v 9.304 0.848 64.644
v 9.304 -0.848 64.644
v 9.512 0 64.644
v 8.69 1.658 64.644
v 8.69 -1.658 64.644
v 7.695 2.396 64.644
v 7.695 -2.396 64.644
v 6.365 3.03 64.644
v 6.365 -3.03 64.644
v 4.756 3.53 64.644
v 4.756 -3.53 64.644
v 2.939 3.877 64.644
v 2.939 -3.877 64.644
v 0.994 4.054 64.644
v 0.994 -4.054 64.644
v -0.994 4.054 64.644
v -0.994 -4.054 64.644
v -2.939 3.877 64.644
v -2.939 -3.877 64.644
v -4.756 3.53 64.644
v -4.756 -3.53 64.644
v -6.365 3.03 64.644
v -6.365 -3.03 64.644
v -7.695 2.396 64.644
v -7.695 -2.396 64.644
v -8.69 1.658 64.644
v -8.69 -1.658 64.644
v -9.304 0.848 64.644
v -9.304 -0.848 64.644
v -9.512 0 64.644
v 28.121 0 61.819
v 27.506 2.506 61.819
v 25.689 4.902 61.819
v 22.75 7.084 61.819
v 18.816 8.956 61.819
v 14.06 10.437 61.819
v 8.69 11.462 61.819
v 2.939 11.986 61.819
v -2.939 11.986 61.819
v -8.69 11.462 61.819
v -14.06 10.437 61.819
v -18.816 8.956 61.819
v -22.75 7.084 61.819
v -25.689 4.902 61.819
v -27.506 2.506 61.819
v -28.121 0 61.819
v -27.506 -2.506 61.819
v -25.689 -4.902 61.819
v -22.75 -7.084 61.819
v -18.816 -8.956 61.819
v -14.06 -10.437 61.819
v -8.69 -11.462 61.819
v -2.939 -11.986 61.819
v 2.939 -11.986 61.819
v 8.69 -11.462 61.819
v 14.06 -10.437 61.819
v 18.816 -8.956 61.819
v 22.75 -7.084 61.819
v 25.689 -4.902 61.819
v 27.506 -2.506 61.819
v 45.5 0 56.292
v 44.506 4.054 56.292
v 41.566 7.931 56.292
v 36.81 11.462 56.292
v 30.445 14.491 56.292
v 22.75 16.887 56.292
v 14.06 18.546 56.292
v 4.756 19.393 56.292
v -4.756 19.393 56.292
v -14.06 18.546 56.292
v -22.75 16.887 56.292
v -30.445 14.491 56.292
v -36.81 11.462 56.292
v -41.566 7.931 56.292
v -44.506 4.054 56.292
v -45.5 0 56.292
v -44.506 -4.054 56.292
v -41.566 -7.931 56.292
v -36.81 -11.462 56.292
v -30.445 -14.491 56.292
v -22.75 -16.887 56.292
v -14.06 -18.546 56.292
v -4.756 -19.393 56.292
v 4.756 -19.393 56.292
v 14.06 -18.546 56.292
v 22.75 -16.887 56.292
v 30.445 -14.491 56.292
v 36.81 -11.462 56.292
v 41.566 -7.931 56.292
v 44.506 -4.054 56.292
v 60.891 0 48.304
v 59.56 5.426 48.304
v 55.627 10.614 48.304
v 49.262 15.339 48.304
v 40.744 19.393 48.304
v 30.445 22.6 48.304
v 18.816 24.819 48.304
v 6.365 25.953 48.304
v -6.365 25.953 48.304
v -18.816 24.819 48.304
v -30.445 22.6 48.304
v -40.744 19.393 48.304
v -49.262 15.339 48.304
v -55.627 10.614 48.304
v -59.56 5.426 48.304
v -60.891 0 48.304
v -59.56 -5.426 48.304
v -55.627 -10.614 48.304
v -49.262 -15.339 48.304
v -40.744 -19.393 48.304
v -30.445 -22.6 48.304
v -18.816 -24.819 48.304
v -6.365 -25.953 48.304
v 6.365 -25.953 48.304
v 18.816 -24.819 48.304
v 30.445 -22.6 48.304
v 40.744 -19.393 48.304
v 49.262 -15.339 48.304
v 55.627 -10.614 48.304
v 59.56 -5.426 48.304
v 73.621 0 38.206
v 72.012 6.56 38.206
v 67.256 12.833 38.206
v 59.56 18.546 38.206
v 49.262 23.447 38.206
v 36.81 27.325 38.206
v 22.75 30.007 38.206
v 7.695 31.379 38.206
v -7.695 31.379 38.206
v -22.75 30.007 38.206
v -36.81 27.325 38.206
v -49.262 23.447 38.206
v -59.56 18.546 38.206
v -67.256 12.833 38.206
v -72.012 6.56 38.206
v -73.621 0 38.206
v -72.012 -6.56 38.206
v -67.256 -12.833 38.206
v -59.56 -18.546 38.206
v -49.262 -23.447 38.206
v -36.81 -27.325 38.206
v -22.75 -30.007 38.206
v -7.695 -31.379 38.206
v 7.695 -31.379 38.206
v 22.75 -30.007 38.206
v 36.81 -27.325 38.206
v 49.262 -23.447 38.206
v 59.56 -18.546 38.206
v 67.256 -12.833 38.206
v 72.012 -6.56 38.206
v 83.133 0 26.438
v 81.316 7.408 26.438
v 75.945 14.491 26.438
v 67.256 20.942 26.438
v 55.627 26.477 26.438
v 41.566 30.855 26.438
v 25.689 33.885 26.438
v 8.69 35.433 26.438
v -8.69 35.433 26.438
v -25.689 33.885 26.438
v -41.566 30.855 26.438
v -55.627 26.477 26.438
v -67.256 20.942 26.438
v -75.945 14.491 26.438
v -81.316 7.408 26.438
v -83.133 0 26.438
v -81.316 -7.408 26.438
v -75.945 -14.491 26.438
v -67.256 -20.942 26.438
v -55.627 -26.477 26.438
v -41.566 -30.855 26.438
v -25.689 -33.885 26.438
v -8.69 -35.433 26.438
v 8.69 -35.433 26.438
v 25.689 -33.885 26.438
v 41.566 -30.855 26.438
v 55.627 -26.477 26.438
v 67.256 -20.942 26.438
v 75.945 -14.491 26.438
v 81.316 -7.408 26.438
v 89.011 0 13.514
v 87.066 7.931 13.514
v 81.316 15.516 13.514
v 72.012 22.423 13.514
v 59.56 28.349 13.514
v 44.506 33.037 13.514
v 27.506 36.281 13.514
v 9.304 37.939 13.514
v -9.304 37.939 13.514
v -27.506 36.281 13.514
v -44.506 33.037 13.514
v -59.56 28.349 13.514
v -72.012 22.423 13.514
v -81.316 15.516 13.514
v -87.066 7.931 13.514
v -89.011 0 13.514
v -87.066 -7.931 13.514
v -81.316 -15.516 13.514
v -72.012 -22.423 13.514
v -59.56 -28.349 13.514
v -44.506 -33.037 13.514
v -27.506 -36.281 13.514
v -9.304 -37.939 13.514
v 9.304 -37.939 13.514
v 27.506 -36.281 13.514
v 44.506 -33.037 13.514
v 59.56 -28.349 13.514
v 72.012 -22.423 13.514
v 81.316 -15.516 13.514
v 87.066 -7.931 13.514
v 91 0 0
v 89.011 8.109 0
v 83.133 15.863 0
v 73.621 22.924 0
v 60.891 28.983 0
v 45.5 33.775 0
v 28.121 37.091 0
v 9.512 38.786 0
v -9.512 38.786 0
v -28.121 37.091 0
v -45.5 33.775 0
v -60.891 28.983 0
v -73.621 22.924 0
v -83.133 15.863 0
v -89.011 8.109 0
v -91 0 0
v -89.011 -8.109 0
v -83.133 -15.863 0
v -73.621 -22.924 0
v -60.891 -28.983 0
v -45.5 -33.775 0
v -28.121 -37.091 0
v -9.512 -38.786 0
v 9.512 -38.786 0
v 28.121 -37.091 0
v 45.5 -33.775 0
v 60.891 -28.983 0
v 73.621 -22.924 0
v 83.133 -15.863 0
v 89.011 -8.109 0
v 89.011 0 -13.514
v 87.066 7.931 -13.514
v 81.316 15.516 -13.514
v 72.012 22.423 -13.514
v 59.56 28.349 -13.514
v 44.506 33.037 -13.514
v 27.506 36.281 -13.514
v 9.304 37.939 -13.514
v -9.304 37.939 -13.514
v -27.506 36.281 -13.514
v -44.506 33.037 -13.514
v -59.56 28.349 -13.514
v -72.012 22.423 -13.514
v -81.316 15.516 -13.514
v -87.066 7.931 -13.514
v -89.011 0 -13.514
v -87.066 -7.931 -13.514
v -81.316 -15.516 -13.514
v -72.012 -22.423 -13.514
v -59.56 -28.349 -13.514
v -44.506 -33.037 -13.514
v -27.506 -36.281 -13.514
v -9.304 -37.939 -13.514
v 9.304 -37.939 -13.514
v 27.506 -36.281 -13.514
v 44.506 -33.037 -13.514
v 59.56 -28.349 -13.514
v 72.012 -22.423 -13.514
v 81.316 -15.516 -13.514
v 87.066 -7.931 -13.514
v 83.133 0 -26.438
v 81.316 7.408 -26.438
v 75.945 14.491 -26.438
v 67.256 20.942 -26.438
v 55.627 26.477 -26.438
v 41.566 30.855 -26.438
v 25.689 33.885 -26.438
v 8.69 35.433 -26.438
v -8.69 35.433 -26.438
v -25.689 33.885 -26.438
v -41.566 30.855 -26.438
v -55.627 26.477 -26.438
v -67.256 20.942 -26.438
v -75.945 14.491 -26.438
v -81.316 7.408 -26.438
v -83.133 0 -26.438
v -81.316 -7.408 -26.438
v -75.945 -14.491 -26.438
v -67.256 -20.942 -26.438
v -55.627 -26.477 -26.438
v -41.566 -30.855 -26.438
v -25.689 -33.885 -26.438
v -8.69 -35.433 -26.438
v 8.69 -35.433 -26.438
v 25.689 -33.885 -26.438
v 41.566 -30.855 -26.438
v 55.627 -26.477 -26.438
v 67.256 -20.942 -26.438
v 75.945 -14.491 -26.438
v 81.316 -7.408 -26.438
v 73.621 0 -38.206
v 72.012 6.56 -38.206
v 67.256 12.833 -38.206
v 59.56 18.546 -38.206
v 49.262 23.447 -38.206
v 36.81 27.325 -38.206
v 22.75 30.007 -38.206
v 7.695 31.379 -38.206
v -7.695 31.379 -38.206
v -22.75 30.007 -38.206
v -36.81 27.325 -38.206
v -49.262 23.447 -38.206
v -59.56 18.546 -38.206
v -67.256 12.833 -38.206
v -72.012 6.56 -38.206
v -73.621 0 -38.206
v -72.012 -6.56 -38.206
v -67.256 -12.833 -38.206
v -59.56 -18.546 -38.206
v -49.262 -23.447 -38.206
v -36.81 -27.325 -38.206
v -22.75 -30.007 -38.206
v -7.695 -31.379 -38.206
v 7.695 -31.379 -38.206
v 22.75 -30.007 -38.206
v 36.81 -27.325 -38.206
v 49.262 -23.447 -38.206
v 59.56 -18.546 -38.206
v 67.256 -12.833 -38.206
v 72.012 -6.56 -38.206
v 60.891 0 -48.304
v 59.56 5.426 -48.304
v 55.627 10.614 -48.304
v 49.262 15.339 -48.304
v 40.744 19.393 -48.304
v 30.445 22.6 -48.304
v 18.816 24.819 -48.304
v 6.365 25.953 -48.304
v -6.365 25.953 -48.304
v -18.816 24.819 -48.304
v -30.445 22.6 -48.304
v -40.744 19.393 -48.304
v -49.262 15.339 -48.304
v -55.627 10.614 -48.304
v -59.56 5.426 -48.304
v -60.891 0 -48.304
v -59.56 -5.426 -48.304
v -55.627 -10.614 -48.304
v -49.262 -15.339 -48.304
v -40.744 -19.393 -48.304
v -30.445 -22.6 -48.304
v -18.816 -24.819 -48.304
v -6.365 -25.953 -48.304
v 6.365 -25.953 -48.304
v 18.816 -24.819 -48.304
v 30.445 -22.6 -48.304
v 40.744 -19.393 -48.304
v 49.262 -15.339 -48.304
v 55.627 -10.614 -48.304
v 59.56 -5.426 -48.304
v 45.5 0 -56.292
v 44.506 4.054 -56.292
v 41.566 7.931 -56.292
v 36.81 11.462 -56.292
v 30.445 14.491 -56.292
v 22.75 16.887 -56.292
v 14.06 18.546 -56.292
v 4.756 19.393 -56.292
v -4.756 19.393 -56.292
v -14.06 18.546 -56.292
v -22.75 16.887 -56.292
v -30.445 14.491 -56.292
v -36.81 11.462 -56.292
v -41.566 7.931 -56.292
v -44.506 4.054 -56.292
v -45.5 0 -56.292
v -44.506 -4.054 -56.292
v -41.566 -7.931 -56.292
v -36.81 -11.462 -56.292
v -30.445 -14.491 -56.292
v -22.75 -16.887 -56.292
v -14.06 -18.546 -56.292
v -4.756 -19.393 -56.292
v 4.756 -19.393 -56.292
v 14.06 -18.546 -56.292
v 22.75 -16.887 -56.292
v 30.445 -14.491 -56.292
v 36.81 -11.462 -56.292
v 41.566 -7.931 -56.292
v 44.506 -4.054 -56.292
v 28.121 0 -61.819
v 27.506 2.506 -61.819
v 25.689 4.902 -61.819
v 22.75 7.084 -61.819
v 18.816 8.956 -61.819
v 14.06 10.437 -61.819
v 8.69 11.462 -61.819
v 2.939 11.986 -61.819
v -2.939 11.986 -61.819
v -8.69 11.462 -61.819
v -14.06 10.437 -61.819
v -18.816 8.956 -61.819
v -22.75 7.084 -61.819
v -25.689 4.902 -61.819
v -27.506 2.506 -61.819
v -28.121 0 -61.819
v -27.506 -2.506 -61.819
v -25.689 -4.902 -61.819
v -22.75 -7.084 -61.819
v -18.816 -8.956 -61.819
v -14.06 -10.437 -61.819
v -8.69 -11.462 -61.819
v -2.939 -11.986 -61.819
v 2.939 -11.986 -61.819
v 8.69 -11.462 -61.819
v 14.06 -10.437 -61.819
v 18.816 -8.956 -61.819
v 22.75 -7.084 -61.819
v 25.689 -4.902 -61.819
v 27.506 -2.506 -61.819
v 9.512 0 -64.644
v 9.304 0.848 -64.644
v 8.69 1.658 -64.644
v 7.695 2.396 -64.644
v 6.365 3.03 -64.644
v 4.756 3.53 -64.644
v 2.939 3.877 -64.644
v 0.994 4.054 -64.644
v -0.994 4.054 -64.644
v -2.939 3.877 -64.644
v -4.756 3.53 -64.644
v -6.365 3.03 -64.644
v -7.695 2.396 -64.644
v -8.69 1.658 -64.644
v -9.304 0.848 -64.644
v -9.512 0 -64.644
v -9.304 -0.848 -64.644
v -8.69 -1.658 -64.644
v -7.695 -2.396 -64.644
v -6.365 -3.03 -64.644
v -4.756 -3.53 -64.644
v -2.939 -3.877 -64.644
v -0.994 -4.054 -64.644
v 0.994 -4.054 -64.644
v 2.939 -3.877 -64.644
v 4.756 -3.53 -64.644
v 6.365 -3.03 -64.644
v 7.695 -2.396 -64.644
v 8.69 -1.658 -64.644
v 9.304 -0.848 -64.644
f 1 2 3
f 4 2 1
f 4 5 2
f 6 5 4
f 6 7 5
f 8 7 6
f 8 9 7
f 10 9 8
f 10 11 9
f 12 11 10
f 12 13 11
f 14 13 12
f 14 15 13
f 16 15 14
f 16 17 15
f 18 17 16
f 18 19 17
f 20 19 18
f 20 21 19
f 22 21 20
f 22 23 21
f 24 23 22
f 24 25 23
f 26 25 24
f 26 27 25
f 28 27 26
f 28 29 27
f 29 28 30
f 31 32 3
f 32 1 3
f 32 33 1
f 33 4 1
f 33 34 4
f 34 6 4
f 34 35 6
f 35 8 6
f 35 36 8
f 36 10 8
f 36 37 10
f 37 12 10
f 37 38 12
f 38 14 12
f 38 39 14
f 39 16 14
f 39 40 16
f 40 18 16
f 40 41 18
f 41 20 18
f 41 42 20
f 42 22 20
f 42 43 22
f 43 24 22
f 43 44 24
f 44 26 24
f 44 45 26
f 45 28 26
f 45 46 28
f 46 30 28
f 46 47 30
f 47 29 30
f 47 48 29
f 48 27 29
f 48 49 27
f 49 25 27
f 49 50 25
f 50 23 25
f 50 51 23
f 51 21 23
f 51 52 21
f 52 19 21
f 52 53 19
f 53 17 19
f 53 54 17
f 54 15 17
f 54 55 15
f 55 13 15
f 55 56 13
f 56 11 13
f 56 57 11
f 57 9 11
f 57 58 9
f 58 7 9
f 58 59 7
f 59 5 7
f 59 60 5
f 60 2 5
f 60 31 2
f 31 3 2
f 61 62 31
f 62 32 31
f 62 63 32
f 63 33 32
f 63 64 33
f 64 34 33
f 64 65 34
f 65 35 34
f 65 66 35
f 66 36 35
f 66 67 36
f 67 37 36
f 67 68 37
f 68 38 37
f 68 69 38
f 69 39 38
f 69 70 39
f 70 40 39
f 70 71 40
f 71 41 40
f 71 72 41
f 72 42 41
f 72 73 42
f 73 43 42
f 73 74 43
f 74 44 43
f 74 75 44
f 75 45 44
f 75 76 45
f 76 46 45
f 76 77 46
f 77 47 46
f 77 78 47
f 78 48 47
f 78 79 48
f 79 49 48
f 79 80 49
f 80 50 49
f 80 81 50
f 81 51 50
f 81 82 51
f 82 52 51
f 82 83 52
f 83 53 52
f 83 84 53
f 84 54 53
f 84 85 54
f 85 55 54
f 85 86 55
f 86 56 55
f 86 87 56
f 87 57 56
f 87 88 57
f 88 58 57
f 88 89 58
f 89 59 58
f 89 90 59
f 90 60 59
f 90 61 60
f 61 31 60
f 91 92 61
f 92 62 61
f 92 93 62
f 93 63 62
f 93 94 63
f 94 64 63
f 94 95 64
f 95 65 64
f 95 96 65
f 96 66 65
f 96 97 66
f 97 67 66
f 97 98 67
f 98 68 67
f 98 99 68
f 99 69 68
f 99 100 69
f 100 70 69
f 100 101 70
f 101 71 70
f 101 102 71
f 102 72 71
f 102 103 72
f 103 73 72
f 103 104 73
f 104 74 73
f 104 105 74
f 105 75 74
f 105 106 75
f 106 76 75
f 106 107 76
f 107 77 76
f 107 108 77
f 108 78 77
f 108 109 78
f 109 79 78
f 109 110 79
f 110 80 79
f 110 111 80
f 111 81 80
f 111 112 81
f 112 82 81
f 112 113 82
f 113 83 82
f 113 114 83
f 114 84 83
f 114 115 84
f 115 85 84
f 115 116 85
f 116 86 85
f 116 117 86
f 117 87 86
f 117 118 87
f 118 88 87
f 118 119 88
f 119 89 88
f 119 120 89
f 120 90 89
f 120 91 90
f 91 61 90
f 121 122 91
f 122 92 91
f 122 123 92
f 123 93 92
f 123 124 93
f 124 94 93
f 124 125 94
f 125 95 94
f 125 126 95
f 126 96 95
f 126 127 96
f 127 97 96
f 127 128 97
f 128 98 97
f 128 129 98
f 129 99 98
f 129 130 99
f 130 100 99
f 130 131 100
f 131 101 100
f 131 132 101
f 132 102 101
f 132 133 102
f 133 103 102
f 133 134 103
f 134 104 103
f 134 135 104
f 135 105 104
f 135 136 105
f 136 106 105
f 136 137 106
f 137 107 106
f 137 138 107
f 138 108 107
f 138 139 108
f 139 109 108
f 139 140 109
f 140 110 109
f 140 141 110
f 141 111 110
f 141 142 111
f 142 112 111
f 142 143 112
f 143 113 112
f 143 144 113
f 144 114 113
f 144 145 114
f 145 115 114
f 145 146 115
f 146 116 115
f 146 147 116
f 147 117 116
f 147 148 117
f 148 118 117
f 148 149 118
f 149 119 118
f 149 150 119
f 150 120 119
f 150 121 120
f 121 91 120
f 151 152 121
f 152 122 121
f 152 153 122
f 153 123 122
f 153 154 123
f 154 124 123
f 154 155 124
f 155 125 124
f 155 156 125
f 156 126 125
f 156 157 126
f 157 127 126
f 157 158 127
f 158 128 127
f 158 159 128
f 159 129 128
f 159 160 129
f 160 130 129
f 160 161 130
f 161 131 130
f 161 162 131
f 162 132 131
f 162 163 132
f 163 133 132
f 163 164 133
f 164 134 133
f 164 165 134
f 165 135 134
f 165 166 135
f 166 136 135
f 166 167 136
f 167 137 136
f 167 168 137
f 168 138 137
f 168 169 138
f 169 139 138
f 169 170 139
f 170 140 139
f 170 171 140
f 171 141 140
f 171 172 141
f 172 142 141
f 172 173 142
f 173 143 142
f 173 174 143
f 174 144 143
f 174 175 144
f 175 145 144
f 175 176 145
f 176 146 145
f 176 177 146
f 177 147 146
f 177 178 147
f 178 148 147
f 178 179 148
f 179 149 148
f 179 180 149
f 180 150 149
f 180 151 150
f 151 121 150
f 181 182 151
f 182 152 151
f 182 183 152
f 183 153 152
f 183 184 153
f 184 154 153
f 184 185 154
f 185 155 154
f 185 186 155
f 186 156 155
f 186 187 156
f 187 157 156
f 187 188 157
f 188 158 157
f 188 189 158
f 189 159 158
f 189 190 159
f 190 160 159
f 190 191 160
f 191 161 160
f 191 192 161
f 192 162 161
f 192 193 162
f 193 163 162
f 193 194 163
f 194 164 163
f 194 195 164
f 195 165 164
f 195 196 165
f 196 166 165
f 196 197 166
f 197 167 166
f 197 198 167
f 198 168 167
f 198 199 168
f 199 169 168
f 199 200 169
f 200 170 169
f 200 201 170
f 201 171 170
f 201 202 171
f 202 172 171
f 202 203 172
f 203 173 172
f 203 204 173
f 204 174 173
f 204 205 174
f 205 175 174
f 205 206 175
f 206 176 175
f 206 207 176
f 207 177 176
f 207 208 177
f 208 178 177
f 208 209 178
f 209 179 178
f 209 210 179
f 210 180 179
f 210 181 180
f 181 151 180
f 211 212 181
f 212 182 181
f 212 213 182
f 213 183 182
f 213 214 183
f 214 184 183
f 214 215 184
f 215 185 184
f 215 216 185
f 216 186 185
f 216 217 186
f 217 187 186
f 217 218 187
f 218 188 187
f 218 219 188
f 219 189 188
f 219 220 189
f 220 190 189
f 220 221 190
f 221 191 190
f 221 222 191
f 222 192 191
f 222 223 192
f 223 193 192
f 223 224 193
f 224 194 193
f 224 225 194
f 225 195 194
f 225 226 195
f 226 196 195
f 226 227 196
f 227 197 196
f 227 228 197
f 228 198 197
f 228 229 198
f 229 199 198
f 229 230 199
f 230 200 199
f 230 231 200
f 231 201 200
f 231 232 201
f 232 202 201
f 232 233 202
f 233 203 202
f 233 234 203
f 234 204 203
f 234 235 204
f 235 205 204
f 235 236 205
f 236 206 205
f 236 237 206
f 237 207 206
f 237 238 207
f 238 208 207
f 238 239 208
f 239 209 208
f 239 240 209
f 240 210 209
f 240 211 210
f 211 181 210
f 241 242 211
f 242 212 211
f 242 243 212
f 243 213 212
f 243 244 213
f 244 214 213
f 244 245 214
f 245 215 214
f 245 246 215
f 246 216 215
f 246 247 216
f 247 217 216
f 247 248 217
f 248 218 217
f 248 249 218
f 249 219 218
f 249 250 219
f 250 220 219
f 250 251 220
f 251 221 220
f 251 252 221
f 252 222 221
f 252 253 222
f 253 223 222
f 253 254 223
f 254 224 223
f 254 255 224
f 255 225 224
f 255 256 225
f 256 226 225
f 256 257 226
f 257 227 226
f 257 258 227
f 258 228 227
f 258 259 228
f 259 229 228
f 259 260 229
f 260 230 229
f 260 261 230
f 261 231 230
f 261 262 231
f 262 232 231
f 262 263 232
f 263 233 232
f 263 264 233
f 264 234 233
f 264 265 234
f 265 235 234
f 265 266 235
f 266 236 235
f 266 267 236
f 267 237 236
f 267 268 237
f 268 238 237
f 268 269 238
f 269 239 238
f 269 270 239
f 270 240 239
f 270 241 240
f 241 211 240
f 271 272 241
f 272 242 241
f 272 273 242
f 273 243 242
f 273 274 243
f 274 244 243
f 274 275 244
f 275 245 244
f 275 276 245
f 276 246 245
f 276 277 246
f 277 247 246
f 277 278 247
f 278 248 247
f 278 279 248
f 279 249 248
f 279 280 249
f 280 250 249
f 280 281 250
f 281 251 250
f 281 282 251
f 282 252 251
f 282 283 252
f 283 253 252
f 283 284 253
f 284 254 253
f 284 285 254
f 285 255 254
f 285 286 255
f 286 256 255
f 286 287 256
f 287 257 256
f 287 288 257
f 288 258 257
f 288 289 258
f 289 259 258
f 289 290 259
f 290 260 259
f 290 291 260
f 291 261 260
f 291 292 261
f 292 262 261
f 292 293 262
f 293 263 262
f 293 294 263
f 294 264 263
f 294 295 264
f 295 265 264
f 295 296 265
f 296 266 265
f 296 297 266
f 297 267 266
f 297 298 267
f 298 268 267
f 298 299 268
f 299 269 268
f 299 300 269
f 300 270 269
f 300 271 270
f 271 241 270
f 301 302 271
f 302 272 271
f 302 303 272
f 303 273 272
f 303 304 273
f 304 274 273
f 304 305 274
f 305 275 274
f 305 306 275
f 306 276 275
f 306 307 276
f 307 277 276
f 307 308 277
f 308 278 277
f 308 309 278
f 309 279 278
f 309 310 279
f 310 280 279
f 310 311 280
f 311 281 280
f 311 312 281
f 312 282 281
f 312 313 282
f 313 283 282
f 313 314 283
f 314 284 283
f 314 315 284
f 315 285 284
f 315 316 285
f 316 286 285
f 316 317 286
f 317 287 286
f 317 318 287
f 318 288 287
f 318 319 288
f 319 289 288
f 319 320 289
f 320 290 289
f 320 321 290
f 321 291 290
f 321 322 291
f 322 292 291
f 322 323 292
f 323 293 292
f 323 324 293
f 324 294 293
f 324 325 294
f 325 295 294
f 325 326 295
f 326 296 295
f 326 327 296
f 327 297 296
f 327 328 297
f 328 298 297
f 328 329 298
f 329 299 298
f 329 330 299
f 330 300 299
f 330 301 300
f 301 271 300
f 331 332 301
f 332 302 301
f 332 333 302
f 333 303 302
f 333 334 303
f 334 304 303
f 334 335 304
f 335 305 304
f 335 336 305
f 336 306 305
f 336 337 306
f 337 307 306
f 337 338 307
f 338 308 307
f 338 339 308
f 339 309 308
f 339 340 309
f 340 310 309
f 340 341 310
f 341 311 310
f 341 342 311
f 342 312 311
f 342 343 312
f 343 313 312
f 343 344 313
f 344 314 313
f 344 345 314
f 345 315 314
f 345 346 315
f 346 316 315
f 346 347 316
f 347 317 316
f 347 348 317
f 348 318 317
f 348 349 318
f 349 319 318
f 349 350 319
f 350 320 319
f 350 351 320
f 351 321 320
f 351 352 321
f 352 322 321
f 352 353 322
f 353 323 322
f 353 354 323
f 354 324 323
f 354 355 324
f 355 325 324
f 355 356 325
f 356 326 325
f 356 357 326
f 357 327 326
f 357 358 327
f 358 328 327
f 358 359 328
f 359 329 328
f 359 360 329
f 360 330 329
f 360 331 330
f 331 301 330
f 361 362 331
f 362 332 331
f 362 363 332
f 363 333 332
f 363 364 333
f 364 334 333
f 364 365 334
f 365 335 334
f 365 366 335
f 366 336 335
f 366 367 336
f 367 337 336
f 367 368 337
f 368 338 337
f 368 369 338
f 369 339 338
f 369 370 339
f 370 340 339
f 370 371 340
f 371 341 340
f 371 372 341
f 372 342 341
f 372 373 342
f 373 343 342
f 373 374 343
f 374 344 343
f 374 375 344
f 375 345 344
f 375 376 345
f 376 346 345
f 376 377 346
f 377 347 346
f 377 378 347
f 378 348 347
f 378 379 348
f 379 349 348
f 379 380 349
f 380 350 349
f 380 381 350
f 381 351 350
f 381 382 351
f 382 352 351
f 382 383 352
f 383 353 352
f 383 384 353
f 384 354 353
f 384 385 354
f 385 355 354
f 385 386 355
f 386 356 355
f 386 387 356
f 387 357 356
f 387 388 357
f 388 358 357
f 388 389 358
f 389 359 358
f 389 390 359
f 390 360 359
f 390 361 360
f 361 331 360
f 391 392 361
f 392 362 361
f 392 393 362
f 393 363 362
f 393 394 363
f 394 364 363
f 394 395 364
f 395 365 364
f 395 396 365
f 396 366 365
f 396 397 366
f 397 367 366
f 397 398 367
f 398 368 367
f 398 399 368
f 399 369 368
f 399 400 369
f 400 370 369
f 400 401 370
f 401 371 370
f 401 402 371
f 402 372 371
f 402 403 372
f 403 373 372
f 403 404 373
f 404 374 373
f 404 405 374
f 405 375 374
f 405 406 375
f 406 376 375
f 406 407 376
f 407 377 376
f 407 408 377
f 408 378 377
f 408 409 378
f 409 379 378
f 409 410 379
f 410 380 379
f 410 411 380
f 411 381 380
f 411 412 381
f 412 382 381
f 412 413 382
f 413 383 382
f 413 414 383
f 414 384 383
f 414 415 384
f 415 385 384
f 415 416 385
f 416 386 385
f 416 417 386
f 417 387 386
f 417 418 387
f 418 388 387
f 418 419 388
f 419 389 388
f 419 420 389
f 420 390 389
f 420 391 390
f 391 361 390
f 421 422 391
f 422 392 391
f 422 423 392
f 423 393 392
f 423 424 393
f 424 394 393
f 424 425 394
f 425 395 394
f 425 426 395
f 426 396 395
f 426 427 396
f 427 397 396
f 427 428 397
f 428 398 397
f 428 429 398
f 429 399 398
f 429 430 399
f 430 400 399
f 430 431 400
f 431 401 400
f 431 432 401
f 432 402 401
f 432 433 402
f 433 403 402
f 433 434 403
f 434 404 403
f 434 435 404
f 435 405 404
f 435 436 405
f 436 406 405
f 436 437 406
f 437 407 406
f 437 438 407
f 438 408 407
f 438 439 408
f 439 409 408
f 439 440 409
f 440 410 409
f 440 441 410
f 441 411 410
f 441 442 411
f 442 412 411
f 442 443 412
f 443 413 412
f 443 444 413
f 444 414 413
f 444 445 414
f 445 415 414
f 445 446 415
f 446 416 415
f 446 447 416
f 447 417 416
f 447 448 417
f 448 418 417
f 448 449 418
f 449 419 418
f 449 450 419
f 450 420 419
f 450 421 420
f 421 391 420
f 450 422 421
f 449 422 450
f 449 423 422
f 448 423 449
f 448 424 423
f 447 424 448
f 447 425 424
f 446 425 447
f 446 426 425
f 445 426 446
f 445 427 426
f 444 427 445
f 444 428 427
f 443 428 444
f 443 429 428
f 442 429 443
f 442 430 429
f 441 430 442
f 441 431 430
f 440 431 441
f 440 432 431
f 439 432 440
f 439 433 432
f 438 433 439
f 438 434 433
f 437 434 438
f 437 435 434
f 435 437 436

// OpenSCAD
// Generated by SolidPython 1.0.1 on 2020-07-29 00:46:47


scale(v = [7, 3, 5]) {
	sphere(r = 13);
}
/***********************************************
*********      SolidPython code:      **********
************************************************
 
# import packages: SolidPython
from solid import *
from solid.utils import *
from itertools import chain, combinations, permutations


class Resize:

    def __init__(self, scad_file):
        self.scad_file = scad_file
        #self.scad_file = import_scad(scad_file)
        # cone/cylinder param:
        self.r1 = 0
        self.r2 = 0
        self.h = 0
        # rectangular prism param:
        self.w = 0
        self.l = 0
        # ellipse param:
        self.r = 0

    # import OpenScad code (file name corresponds to shape)


    # classify shape + parameters
    def assign(self, param1, param2, param3):
        if self.scad_file == 'cone.scad':
            self.r1 = param1
            self.r2 = param2
            self.h = param3
        elif self.scad_file == 'cylinder.scad':
            self.r1 = param1
            self.r2 = param2
            self.h = param3
        elif self.scad_file == 'rectangularPrism.scad':
            self.h = param1
            self.l = param2
            self.w = param3
        else:
            self.r = param1
            self.h = param2

    # resize parameters
    def iterate(self):
        x = range(3, 20, 2)
        i = 1
        if self.scad_file == 'cone.scad':
            tempList = list(permutations(x, 2))
            for temp in tempList:
                param1 = temp[0]
                param2 = temp[1]
                filepath = 'produced_scad_files/' + 'cone' + str(param1) + '_' + str(param2) + '_' + '.scad'
                scad_render_to_file(cylinder(h=param1, r1=param2, r2=0), filepath)

        elif self.scad_file == 'cylinder.scad':
            tempList = list(permutations(x, 3))
            for temp in tempList:
                param1 = temp[0]
                param2 = temp[1]
                filepath = 'produced_scad_files/' + 'cylinder' + str(param1) + '_' + str(param2) + '_' + '.scad'
                scad_render_to_file(cylinder(h=param1, r1=param2, r2=param2), filepath)

        elif self.scad_file == 'rectangularPrism.scad':
            tempList = list(permutations(x, 3))
            for temp in tempList:
                param1 = temp[0]
                param2 = temp[1]
                param3 = temp[2]
                filepath = 'produced_scad_files/' + 'rectangularPrism' + str(param1) + '_' + str(param2) + '_' + str(
                    param3) + '.scad'
                scad_render_to_file(cube(size=(param1, param2, param3)), filepath)

        elif self.scad_file == 'ellipse.scad':
            tempList = list(permutations(x, 4))
            for temp in tempList:
                param1 = temp[0]
                param2 = temp[1]
                param3 = temp[2]
                param4 = temp[3]
                filepath = 'produced_scad_files/' + 'ellipse' + str(param1) + '_' + str(param2) + '_' + str(param3) + '_' + str(param4) + '.scad'
                scad_render_to_file(scale([param1, param2, param3])(sphere(r=param4)), filepath)

    def render_to_scadfile(self):
        scad_render_to_file(scad, 'example.scad') 
 
************************************************/
